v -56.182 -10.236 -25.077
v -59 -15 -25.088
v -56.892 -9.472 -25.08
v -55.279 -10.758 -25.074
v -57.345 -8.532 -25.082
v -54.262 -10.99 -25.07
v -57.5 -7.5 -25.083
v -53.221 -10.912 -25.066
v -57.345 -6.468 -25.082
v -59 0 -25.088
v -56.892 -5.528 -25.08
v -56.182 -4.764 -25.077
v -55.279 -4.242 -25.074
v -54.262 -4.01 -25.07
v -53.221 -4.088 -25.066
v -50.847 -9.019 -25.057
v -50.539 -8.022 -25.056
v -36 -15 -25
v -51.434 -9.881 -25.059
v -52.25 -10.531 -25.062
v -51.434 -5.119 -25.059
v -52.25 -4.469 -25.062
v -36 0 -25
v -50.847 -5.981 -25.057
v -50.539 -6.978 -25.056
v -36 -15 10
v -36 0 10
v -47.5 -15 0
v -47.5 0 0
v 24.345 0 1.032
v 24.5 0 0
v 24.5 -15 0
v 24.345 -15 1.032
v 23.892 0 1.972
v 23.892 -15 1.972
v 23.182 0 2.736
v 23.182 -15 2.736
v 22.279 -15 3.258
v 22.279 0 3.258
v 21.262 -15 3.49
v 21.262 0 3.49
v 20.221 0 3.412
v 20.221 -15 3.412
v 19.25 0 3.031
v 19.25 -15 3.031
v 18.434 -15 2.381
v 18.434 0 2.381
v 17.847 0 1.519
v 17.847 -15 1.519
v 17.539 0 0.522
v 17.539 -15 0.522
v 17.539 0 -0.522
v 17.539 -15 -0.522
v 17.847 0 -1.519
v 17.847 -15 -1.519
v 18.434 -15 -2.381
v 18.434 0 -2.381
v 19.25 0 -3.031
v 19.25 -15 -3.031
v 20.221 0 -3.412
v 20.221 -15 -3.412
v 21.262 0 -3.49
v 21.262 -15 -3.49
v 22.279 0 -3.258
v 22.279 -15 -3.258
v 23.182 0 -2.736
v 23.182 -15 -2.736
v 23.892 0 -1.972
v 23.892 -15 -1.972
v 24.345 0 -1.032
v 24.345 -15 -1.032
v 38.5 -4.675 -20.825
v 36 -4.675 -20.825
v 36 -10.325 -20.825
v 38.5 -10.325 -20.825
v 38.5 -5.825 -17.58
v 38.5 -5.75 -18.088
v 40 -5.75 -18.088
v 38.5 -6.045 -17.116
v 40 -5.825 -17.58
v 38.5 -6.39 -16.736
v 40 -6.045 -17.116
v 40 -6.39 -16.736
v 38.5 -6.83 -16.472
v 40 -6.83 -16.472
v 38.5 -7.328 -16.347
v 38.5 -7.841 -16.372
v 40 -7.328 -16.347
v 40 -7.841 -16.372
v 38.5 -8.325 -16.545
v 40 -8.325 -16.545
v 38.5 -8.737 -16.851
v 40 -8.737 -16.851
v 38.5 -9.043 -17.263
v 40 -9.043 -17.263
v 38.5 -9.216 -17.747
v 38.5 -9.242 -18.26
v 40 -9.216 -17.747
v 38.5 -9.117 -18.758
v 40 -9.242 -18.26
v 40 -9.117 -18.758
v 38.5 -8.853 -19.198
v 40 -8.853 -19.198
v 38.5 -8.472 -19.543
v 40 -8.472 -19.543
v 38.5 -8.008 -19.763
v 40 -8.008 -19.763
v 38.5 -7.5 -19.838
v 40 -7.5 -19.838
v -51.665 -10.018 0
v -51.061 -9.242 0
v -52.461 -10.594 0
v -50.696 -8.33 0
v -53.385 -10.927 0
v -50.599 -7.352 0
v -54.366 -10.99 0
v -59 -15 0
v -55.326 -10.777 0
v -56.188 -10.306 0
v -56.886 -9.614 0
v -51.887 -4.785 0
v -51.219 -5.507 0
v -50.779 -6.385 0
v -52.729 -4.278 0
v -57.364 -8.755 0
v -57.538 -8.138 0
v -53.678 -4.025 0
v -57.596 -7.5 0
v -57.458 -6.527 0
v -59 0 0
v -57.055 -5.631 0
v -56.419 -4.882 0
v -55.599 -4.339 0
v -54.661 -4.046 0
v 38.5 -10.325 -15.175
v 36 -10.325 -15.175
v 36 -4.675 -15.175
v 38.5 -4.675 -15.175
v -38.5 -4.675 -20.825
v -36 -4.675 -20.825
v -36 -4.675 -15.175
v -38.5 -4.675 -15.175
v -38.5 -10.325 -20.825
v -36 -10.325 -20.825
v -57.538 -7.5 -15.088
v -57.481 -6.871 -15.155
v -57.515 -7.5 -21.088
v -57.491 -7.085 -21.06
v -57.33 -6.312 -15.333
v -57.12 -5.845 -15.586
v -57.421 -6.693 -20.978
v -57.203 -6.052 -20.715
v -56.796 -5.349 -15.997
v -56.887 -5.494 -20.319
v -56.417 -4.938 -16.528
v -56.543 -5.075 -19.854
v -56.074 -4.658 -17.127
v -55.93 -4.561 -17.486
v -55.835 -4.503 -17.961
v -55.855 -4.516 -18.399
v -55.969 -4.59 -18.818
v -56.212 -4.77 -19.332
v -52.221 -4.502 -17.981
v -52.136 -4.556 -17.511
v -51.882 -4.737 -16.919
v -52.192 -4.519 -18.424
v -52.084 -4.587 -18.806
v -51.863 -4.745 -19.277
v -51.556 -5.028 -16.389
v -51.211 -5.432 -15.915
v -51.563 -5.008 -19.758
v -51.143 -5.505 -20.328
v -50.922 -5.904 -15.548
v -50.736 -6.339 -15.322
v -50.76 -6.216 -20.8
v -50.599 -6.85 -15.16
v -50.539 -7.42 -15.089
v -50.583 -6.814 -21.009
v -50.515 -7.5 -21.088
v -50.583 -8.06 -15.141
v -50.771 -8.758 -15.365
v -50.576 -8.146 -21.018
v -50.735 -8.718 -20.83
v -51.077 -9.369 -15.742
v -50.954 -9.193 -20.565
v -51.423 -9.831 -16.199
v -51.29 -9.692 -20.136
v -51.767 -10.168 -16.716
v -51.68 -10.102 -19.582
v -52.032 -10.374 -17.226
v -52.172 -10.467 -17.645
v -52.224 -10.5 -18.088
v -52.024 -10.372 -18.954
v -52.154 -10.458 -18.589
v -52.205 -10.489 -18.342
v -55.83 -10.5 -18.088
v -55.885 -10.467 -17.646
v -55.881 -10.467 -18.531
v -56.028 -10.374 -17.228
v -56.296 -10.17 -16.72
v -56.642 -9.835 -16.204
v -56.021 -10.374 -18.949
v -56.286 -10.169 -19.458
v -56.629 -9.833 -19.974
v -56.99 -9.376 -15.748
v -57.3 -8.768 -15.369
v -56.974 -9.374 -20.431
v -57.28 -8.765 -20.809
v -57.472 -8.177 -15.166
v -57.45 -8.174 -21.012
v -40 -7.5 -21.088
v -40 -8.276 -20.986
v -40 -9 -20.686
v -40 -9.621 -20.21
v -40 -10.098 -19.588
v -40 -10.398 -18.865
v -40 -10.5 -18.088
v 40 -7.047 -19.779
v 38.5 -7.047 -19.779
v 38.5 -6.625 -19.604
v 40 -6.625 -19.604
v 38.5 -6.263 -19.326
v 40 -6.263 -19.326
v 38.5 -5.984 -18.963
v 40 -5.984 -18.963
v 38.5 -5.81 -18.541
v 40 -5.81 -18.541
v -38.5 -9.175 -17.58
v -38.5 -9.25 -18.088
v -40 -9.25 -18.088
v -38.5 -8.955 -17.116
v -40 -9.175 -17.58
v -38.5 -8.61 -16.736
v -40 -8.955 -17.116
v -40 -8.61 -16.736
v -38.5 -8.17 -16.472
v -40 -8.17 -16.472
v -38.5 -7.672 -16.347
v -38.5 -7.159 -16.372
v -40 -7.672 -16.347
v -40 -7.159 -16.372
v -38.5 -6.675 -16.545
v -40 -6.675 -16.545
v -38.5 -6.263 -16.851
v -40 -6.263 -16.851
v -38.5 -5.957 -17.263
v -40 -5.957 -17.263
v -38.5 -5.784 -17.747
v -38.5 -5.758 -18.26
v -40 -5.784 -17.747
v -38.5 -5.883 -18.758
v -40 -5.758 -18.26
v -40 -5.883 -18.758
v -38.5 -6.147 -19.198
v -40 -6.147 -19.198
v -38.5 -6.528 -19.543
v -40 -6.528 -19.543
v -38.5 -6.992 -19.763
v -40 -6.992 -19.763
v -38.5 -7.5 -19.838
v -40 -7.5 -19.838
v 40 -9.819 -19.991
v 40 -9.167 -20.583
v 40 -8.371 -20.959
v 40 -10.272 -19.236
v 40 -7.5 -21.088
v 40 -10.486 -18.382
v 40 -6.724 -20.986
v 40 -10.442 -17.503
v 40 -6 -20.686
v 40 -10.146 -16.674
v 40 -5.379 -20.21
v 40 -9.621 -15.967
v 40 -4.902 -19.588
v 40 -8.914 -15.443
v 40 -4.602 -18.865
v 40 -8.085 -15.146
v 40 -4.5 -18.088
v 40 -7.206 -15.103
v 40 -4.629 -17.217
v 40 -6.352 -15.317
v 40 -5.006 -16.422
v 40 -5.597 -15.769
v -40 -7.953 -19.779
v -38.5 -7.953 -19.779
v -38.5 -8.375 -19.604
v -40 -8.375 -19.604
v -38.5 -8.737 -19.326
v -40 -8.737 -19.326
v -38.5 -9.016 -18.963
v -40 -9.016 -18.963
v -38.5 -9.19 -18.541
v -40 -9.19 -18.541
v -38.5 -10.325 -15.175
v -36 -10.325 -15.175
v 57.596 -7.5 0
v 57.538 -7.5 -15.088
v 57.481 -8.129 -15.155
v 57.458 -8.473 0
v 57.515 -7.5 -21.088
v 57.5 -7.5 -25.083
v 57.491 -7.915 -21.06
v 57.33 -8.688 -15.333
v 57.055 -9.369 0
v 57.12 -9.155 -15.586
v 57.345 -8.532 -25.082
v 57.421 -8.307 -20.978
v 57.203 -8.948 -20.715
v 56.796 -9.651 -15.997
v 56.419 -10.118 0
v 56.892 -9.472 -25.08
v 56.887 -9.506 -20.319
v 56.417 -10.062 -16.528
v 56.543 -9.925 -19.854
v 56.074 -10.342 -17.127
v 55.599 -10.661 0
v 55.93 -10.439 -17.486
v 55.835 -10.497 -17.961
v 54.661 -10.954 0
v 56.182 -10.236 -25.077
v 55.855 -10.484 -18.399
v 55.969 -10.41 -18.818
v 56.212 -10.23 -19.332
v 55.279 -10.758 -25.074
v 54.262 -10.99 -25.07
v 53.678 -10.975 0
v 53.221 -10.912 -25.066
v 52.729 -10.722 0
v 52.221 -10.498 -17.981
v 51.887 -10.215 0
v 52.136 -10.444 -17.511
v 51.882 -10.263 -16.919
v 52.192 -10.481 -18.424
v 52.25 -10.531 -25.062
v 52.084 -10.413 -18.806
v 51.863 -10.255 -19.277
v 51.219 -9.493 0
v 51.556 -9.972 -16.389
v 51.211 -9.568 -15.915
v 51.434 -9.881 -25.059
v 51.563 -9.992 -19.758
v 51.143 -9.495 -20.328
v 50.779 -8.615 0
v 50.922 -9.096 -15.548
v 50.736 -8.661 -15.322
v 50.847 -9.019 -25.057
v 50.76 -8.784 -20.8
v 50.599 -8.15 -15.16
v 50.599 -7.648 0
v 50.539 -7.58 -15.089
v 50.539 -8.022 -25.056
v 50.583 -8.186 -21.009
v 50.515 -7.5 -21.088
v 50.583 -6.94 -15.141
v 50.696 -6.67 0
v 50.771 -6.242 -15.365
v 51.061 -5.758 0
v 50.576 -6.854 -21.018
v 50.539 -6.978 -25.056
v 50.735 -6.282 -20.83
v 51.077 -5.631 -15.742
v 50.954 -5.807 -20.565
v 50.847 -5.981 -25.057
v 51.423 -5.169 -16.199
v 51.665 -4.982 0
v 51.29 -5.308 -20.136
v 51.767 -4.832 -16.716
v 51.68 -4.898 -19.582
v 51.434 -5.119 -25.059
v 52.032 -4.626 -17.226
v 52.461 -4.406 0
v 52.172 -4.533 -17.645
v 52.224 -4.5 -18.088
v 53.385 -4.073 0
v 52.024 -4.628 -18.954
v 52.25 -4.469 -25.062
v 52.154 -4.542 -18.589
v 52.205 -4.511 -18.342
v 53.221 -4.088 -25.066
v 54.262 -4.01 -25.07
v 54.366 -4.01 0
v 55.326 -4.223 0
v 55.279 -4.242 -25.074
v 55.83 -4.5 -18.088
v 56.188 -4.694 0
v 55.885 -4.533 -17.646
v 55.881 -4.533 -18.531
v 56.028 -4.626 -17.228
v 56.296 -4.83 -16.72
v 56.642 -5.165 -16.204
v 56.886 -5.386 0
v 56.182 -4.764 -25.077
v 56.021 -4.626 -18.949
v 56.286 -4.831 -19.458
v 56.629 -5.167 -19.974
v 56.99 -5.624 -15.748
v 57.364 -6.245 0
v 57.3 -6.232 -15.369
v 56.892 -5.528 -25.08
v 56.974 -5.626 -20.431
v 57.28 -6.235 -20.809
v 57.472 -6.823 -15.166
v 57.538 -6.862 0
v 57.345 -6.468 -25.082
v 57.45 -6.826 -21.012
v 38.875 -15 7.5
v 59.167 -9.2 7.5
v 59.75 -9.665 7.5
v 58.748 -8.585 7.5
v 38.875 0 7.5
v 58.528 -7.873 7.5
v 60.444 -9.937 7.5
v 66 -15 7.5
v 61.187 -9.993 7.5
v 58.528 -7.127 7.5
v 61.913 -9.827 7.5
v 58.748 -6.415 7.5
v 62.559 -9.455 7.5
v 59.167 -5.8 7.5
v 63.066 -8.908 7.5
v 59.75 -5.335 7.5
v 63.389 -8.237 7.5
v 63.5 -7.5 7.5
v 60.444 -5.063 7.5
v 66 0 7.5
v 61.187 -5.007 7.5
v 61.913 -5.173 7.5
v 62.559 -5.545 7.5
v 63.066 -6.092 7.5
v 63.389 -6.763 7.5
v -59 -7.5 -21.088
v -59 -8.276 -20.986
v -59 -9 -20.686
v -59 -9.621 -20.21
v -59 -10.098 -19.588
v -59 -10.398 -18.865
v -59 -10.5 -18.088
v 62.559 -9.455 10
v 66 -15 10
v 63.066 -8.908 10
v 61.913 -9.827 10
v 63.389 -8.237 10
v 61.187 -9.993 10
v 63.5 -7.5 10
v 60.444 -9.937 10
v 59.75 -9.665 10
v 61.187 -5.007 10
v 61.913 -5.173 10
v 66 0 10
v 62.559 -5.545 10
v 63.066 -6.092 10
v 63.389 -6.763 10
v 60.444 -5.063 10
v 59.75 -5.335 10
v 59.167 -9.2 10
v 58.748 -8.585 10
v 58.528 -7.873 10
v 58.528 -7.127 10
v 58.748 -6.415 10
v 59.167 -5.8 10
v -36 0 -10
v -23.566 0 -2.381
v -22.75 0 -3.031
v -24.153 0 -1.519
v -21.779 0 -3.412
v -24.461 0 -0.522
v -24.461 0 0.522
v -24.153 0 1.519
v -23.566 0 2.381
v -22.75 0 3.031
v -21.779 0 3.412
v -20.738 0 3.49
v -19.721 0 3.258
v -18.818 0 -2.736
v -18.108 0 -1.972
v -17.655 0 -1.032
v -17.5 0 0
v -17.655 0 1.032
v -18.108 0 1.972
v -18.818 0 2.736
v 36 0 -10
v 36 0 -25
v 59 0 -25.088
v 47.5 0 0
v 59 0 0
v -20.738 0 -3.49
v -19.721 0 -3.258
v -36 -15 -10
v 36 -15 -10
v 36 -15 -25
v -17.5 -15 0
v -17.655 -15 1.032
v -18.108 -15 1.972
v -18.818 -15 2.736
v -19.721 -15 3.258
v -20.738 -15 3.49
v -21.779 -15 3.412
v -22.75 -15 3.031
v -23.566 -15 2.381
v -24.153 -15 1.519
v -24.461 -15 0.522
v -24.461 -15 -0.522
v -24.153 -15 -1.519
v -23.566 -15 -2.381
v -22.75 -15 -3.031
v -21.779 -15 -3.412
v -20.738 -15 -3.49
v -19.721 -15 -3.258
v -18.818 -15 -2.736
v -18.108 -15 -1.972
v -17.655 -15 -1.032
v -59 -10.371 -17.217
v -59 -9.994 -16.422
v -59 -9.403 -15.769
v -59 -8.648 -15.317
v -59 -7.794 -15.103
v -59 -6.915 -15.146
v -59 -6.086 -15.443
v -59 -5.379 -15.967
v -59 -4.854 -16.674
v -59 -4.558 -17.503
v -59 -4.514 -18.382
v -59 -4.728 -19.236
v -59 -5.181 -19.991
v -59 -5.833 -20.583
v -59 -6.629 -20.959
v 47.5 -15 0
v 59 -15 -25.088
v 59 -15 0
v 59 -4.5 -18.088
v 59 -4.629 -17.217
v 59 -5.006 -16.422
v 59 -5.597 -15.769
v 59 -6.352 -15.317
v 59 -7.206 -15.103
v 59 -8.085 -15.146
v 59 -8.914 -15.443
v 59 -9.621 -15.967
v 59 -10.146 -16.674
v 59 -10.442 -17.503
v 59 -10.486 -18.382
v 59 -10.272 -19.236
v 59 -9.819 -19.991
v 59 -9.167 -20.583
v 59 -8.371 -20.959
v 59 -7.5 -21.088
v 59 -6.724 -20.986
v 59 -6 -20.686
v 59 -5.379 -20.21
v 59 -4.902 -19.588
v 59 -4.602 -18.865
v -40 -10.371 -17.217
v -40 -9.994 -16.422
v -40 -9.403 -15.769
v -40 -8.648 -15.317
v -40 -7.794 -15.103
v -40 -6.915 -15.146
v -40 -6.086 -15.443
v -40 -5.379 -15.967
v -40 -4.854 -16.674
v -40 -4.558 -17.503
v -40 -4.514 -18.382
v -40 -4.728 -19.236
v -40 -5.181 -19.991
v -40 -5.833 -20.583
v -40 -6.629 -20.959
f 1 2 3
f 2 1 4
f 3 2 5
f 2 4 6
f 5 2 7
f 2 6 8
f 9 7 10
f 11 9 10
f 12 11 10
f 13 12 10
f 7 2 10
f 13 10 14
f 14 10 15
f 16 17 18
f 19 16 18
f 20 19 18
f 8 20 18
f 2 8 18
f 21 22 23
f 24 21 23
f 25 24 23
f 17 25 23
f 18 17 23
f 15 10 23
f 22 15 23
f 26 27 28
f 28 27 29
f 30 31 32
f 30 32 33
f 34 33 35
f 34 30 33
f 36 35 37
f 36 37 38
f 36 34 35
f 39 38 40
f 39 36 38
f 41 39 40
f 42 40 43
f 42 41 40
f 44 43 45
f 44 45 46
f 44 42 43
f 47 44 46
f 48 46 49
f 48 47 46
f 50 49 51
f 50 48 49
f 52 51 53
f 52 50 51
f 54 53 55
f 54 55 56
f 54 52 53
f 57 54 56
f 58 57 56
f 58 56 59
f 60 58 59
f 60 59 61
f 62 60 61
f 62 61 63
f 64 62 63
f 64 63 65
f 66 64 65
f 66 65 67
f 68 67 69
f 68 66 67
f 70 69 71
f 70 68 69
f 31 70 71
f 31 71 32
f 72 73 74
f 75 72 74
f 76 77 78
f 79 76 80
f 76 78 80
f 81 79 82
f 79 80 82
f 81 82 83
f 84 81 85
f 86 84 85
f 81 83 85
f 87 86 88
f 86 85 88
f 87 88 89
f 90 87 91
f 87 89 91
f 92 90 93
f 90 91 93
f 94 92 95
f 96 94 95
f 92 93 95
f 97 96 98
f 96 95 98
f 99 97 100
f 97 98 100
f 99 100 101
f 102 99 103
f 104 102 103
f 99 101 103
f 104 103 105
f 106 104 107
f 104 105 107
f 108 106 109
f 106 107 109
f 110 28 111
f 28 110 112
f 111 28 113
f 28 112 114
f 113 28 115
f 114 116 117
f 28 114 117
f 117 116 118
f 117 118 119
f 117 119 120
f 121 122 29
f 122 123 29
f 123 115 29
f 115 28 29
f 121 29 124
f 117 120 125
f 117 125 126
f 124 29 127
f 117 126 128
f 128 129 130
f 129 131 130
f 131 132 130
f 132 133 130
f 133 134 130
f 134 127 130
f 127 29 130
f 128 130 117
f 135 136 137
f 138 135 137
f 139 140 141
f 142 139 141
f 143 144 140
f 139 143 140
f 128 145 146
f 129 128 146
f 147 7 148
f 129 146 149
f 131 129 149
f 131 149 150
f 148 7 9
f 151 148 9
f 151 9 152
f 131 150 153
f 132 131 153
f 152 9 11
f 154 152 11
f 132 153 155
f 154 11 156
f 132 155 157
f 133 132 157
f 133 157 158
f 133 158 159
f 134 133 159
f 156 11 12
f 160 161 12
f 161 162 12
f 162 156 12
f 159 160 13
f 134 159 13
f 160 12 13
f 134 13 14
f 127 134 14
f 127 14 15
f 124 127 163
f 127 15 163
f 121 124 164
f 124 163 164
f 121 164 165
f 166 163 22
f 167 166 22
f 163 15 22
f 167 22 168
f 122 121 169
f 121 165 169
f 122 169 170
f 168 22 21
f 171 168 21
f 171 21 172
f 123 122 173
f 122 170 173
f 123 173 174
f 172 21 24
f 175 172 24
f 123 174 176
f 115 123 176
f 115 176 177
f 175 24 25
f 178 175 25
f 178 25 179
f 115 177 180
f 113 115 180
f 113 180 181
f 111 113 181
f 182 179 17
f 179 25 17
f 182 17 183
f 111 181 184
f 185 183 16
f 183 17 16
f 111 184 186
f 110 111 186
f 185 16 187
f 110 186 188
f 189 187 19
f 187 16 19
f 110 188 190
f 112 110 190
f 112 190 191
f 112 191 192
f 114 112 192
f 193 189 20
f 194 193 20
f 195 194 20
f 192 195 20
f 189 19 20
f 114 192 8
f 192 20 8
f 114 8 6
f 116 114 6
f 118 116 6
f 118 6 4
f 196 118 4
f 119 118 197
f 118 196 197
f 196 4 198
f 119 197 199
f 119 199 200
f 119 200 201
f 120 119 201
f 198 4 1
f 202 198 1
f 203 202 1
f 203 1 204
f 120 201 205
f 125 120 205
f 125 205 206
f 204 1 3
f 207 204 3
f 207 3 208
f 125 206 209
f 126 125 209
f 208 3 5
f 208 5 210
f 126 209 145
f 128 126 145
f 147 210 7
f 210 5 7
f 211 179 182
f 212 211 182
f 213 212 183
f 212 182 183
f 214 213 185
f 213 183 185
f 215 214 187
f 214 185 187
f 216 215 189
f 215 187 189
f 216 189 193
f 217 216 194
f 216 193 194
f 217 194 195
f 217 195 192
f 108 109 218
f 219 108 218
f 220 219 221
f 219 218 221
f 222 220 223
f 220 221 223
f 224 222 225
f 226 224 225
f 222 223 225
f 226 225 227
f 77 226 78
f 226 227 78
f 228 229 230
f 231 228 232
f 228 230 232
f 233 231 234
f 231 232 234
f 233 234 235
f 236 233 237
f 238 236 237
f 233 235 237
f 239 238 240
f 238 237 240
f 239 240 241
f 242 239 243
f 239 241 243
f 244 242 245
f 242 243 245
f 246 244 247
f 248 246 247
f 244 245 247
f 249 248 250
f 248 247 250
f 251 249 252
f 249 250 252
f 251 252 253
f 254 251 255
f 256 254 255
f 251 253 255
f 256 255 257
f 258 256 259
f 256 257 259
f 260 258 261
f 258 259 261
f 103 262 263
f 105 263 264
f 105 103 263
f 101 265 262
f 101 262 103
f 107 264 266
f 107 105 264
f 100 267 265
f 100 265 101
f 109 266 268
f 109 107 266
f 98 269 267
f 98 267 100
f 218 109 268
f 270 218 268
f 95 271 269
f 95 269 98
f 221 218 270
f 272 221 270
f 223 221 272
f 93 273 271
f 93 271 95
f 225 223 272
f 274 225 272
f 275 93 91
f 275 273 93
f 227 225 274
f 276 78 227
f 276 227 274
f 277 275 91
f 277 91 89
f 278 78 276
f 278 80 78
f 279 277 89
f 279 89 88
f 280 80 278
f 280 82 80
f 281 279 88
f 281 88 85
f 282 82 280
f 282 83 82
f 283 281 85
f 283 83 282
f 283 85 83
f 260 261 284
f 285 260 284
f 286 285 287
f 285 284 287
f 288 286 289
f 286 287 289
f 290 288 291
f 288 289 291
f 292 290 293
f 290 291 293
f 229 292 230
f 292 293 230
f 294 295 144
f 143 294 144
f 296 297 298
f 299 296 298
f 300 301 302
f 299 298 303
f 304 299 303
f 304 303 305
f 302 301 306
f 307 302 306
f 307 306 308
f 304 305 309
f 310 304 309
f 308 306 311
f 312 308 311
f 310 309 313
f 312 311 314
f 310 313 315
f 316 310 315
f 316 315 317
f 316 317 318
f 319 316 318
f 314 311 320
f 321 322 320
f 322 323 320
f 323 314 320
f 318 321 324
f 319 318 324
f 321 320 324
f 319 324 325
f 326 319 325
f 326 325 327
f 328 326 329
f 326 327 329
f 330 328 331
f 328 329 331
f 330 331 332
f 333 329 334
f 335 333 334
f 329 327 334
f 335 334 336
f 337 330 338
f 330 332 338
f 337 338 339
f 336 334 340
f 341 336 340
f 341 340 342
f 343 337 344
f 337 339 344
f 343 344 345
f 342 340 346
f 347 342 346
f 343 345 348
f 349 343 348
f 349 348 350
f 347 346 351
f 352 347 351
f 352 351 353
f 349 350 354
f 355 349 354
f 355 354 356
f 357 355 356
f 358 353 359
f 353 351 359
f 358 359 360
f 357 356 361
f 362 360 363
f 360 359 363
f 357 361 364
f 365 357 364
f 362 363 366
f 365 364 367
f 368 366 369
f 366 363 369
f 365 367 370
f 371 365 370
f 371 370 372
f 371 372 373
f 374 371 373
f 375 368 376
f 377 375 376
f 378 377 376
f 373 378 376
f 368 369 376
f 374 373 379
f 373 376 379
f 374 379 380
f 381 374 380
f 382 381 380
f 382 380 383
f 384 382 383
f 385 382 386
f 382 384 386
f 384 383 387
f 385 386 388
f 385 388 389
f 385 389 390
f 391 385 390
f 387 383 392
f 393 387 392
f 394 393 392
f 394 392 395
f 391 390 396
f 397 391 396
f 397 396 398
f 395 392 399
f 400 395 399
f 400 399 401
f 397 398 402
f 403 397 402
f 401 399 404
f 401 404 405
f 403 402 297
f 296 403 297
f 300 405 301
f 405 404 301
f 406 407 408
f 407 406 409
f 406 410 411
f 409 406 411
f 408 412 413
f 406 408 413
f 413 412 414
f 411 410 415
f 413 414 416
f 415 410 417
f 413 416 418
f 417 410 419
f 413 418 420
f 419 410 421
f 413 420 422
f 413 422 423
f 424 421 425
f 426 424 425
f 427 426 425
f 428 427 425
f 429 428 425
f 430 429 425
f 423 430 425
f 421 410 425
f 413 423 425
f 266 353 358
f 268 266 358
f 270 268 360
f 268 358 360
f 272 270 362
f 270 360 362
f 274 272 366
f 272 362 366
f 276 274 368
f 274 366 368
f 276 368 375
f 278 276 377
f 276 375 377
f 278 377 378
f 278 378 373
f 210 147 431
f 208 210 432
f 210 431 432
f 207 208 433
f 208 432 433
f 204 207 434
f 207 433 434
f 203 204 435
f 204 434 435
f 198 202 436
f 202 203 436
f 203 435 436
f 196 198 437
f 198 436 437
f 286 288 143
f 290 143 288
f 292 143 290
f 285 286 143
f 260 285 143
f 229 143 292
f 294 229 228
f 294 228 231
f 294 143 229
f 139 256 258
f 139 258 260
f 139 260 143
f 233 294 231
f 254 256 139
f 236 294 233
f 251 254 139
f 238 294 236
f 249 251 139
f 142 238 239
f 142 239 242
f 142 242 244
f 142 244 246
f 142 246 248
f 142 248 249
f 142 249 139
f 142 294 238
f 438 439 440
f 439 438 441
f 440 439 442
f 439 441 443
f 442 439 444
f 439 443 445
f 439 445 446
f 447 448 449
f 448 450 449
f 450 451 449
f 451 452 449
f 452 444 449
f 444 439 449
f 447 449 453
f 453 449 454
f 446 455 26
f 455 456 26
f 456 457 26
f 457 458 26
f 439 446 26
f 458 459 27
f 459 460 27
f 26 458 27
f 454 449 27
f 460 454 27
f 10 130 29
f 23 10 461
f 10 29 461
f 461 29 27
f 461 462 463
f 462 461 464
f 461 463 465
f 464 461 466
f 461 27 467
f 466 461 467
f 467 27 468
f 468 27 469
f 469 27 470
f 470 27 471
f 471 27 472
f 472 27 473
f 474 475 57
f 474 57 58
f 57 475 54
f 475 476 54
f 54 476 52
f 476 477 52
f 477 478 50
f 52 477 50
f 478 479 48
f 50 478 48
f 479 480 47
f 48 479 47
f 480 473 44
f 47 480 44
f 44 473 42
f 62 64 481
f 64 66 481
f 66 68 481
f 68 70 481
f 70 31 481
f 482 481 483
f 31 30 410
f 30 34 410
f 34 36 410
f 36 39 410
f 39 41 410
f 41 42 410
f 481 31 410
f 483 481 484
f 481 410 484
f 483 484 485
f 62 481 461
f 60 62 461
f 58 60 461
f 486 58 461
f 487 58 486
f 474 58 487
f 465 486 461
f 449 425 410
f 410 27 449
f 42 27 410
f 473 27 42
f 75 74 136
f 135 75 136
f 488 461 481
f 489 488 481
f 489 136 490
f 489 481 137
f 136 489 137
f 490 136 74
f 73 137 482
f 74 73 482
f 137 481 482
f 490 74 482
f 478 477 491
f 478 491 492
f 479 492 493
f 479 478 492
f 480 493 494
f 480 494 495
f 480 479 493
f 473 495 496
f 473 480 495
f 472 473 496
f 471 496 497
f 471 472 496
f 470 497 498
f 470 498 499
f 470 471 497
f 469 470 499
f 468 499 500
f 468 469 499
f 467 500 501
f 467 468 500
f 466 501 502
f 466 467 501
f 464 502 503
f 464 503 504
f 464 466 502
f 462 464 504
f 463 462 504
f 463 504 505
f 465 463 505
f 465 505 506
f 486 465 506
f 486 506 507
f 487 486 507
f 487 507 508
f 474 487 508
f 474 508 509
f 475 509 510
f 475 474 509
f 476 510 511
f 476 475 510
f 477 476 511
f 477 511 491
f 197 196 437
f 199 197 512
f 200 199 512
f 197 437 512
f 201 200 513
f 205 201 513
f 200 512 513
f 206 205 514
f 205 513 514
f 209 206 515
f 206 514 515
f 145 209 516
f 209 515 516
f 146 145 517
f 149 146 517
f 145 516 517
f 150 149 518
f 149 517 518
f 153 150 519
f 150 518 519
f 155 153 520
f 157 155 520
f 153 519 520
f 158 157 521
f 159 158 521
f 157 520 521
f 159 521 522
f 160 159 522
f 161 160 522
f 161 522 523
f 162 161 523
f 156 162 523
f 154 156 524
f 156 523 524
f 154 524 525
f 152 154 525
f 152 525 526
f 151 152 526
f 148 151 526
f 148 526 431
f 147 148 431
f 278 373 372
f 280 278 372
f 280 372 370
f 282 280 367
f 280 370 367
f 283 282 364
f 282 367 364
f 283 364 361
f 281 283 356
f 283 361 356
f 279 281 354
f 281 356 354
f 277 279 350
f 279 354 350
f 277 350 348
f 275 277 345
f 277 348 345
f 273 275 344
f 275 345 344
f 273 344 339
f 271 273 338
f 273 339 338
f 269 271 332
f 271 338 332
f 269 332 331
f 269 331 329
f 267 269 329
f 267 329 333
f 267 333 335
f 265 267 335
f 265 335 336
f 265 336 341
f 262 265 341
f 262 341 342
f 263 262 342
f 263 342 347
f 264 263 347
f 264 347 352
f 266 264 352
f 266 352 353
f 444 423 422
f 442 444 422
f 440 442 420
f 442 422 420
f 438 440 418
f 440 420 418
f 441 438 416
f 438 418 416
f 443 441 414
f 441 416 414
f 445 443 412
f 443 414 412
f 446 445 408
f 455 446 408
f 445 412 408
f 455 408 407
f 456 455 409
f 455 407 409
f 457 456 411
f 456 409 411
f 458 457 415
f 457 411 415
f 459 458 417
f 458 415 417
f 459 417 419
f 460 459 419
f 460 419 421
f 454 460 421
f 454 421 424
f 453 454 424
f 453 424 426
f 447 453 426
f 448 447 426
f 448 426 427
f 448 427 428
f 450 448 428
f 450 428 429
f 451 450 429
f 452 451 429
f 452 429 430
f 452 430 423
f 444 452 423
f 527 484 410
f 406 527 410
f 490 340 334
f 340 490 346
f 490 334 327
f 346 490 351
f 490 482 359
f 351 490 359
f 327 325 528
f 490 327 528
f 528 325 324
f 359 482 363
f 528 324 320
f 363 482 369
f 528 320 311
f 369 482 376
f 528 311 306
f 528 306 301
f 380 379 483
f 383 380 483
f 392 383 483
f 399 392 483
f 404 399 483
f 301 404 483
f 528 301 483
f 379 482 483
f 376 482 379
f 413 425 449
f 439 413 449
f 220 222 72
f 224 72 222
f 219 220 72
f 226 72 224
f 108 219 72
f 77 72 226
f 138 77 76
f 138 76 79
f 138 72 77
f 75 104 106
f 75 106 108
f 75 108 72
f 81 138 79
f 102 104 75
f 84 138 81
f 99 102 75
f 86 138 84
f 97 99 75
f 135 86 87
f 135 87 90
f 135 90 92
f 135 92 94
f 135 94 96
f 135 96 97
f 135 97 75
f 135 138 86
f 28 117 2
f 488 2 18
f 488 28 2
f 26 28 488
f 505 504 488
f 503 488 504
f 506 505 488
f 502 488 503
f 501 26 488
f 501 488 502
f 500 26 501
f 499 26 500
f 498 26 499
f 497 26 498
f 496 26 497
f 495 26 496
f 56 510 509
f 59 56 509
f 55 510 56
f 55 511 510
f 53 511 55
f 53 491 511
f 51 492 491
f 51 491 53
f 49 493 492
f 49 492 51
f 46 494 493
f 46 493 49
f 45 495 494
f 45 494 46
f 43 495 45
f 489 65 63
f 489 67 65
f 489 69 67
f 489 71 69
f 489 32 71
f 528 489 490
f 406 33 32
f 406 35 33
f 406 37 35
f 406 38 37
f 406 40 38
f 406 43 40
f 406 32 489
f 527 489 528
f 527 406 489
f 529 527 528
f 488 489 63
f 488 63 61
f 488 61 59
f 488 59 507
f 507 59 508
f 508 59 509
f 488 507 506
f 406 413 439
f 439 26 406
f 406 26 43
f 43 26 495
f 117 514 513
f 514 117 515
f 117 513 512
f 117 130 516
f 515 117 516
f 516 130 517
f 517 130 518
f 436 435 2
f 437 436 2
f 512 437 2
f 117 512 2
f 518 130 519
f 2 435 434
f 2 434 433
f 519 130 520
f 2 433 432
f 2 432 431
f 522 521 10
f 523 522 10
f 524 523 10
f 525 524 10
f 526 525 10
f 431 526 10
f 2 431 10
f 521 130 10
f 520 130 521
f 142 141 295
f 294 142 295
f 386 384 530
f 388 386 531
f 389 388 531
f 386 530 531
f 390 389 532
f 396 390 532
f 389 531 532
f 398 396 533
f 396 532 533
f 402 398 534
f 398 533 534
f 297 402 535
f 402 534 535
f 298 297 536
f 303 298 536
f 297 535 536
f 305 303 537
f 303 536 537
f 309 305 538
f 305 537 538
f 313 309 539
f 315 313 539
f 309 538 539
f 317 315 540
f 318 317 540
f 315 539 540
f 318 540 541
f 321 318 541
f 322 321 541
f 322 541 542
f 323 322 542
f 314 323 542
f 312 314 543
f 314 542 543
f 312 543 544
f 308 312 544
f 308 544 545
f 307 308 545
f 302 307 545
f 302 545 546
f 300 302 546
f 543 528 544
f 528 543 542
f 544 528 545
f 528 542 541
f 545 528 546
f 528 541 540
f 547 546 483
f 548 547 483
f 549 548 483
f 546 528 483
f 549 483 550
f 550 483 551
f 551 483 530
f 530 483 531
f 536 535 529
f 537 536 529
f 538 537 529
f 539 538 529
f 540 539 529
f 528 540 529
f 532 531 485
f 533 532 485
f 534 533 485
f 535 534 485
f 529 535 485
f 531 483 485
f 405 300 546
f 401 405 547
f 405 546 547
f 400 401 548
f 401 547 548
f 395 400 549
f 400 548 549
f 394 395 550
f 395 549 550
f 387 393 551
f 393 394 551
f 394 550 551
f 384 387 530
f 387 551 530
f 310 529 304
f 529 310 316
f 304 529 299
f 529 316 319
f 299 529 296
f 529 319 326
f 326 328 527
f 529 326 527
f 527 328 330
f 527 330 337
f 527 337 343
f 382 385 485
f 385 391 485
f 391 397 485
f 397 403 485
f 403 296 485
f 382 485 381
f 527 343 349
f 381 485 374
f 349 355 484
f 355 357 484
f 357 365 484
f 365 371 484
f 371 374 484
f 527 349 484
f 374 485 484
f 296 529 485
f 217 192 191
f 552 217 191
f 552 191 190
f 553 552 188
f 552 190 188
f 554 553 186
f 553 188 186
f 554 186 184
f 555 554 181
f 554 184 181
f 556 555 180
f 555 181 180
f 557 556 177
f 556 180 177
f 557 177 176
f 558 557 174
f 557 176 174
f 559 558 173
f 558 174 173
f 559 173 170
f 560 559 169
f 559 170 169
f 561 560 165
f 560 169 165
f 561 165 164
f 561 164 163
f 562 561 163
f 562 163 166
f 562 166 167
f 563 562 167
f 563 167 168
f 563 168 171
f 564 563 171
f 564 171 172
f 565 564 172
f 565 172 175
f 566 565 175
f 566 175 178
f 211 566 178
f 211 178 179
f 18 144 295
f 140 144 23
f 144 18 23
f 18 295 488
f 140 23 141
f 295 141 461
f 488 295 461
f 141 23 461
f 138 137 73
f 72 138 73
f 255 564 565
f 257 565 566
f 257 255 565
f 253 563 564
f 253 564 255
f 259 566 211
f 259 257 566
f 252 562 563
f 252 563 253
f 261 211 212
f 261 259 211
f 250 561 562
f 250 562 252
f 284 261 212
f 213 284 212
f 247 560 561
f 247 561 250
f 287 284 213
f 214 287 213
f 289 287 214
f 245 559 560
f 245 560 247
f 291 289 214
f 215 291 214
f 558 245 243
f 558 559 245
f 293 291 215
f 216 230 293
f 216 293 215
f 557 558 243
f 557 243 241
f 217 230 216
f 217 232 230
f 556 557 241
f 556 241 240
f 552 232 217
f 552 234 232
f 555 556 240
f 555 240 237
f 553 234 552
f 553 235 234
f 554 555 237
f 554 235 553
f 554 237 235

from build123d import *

# Parameters (mm, degrees)
F0_R      = 3.5
F1_DEPTH  = 15
F5_DEPTH  = 23
F6_DEPTH  = 19
F2_R      = 3.5
F7_DEPTH  = 26
F8_DEPTH  = 2.5
F12_DEPTH = 19
F13_DEPTH = 23
F14_DEPTH = 2.5
F15_DEPTH = 25.1
F16_R     = 2.5
F17_DEPTH = 25


with BuildPart() as f1:
    # F0 (on Front) → F1 (new body)
    with BuildSketch(Plane.XZ):
        Polygon((36, 10), (-36, 10), (-36, 0), (-36, -10), (36, -10), (36, 0), (36, 7.5), align=None)
        with Locations((-21, 0)):
            Circle(F0_R, mode=Mode.SUBTRACT)
        with Locations((21, 0)):
            Circle(F0_R, mode=Mode.SUBTRACT)
        Polygon((-36, 0), (-36, 10), (-47.5, 0), align=None)
        Polygon((38.875, 7.5), (36, 10), (36, 7.5), align=None)
        Polygon((66, 10), (36, 10), (38.875, 7.5), (66, 7.5), align=None)
        Polygon((-36, -10), (-36, 0), (-47.5, 0), (-59, 0), (-59, -10), align=None)
        Polygon((38.875, 7.5), (36, 7.5), (36, 0), (47.5, 0), align=None)
        Polygon((-36, -25), (-36, -10), (-59, -10), (-59, -25.0883084536), align=None)
        Polygon((47.5, 0), (36, 0), (36, -10), (36, -25), (59, -25.0883084536), (59, -10), (59, 0), align=None)
    extrude(amount=F1_DEPTH)

    # F3 (on face) → F5 (cut)
    with BuildSketch(Plane.YZ.offset(59)):
        with BuildLine():
            ThreePointArc((-5.75, -18.0883084536), (-8.7374368671, -16.8508715865), (-7.5, -19.8383084536))
            ThreePointArc((-7.5, -19.8383084536), (-6.2625631329, -19.3257453206), (-5.75, -18.0883084536))
        make_face()
    extrude(amount=-F5_DEPTH, mode=Mode.SUBTRACT)

    # F3 (on face) → F6 (cut)
    with BuildSketch(Plane.YZ.offset(59)):
        with BuildLine():
            ThreePointArc((-4.5, -18.0883084536), (-9.6213203436, -15.96698811), (-7.5, -21.0883084536))
            ThreePointArc((-7.5, -21.0883084536), (-5.3786796564, -20.2096287971), (-4.5, -18.0883084536))
        make_face()
        with BuildLine():
            ThreePointArc((-5.75, -18.0883084536), (-6.2625631329, -19.3257453206), (-7.5, -19.8383084536))
            ThreePointArc((-7.5, -19.8383084536), (-8.7374368671, -16.8508715865), (-5.75, -18.0883084536))
        make_face(mode=Mode.SUBTRACT)
    extrude(amount=-F6_DEPTH, mode=Mode.SUBTRACT)

    # F2 (on face) → F7 (cut)
    with BuildSketch(Plane(origin=(-0.0954553395, 0, -24.8614115721), x_dir=(0.9999926292, 0, -0.0038394697), z_dir=(-0.0038394697, 0, -0.9999926292))):
        with Locations((54.095890923, 7.5)):
            Circle(F2_R)
    extrude(amount=-F7_DEPTH, mode=Mode.SUBTRACT)

    # F4 (on face) → F8 (cut)
    with BuildSketch(Plane(origin=(36, 0, 0), x_dir=(0, -1, 0), z_dir=(-1, 0, 0))):
        Polygon((4.675, -20.825), (7.5, -20.825), (10.325, -20.825), (10.325, -15.175), (4.675, -15.175), align=None)
    extrude(amount=-F8_DEPTH, mode=Mode.SUBTRACT)

    # F9 (on face) → F12 (cut)
    with BuildSketch(Plane(origin=(-59, 0, 0), x_dir=(0, -1, 0), z_dir=(-1, 0, 0))):
        with BuildLine():
            ThreePointArc((10.5, -18.0883084536), (5.3786796564, -15.96698811), (7.5, -21.0883084536))
            ThreePointArc((7.5, -21.0883084536), (9.6213203436, -20.2096287971), (10.5, -18.0883084536))
        make_face()
        with BuildLine():
            ThreePointArc((9.25, -18.0883084536), (8.7374368671, -19.3257453206), (7.5, -19.8383084536))
            ThreePointArc((7.5, -19.8383084536), (6.2625631329, -16.8508715865), (9.25, -18.0883084536))
        make_face(mode=Mode.SUBTRACT)
    extrude(amount=-F12_DEPTH, mode=Mode.SUBTRACT)

    # F9 (on face) → F13 (cut)
    with BuildSketch(Plane(origin=(-59, 0, 0), x_dir=(0, -1, 0), z_dir=(-1, 0, 0))):
        with BuildLine():
            ThreePointArc((9.25, -18.0883084536), (6.2625631329, -16.8508715865), (7.5, -19.8383084536))
            ThreePointArc((7.5, -19.8383084536), (8.7374368671, -19.3257453206), (9.25, -18.0883084536))
        make_face()
    extrude(amount=-F13_DEPTH, mode=Mode.SUBTRACT)

    # F10 (on face) → F14 (cut)
    with BuildSketch(Plane.YZ.offset(-36)):
        Polygon((-10.325, -20.825), (-7.5, -20.825), (-4.675, -20.825), (-4.675, -15.175), (-10.325, -15.175), align=None)
    extrude(amount=-F14_DEPTH, mode=Mode.SUBTRACT)

    # F11 (on face) → F15 (cut)
    with BuildSketch(Plane(origin=(0.0954553395, 0, -24.8614115721), x_dir=(0.9999926292, 0, 0.0038394697), z_dir=(0.0038394697, 0, -0.9999926292))):
        with BuildLine():
            ThreePointArc((-50.595890923, 7.5), (-54.095890923, 11), (-57.595890923, 7.5))
            ThreePointArc((-57.595890923, 7.5), (-54.095890923, 4), (-50.595890923, 7.5))
        make_face()
    extrude(amount=-F15_DEPTH, mode=Mode.SUBTRACT)

    # F16 (on face) → F17 (cut)
    with BuildSketch(Plane(origin=(0, 0, 7.5), x_dir=(1, 0, 0), z_dir=(0, 0, -1))):
        with Locations((61, 7.5)):
            Circle(F16_R)
    extrude(amount=-F17_DEPTH, mode=Mode.SUBTRACT)


solid = f1.part
